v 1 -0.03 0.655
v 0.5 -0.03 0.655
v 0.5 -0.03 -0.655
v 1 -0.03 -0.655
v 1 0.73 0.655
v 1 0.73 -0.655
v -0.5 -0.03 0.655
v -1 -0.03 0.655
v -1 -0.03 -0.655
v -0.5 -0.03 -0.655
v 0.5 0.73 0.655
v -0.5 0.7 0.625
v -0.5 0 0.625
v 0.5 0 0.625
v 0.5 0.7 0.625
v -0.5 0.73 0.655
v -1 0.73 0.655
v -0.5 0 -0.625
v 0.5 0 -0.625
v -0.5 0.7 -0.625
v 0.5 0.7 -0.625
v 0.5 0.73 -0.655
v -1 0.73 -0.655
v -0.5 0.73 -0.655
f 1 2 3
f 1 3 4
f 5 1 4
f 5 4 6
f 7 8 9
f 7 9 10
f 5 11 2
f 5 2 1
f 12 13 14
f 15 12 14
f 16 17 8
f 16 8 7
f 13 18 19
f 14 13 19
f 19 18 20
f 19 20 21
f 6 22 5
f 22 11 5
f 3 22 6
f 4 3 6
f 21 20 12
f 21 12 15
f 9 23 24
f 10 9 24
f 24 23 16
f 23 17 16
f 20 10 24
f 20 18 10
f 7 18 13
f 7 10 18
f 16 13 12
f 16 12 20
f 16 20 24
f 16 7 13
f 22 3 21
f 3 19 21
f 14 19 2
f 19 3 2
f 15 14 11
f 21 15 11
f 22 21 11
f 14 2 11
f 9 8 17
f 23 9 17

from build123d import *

# Parameters (mm, degrees)
SKETCH1_W           = 2
SKETCH1_H           = 1.25
EXTRUDE1_DEPTH      = 0.7
SKETCH2_W           = 0.5
SKETCH2_H           = 0.76
EXTRUDE2_DEPTH      = 0.655
EXTRUDE2_DEPTH_BACK = 0.655


with BuildPart() as part:
    # Sketch1 → Extrude1 (new body)
    with BuildSketch(Plane(origin=(0, 0, 0), x_dir=(1, 0, 0), z_dir=(0, 1, 0))):
        Rectangle(SKETCH1_W, SKETCH1_H)
    extrude(amount=EXTRUDE1_DEPTH)

    # Sketch2 → Extrude2 (add, two sides)
    with BuildSketch(Plane.XY) as extrude2_sk:
        with Locations((-0.75, 0.35)):
            Rectangle(SKETCH2_W, SKETCH2_H)
        with Locations((0.75, 0.35)):
            Rectangle(SKETCH2_W, SKETCH2_H)
    extrude(amount=EXTRUDE2_DEPTH)
    extrude(extrude2_sk.sketch, amount=-EXTRUDE2_DEPTH_BACK)


solid = part.part
